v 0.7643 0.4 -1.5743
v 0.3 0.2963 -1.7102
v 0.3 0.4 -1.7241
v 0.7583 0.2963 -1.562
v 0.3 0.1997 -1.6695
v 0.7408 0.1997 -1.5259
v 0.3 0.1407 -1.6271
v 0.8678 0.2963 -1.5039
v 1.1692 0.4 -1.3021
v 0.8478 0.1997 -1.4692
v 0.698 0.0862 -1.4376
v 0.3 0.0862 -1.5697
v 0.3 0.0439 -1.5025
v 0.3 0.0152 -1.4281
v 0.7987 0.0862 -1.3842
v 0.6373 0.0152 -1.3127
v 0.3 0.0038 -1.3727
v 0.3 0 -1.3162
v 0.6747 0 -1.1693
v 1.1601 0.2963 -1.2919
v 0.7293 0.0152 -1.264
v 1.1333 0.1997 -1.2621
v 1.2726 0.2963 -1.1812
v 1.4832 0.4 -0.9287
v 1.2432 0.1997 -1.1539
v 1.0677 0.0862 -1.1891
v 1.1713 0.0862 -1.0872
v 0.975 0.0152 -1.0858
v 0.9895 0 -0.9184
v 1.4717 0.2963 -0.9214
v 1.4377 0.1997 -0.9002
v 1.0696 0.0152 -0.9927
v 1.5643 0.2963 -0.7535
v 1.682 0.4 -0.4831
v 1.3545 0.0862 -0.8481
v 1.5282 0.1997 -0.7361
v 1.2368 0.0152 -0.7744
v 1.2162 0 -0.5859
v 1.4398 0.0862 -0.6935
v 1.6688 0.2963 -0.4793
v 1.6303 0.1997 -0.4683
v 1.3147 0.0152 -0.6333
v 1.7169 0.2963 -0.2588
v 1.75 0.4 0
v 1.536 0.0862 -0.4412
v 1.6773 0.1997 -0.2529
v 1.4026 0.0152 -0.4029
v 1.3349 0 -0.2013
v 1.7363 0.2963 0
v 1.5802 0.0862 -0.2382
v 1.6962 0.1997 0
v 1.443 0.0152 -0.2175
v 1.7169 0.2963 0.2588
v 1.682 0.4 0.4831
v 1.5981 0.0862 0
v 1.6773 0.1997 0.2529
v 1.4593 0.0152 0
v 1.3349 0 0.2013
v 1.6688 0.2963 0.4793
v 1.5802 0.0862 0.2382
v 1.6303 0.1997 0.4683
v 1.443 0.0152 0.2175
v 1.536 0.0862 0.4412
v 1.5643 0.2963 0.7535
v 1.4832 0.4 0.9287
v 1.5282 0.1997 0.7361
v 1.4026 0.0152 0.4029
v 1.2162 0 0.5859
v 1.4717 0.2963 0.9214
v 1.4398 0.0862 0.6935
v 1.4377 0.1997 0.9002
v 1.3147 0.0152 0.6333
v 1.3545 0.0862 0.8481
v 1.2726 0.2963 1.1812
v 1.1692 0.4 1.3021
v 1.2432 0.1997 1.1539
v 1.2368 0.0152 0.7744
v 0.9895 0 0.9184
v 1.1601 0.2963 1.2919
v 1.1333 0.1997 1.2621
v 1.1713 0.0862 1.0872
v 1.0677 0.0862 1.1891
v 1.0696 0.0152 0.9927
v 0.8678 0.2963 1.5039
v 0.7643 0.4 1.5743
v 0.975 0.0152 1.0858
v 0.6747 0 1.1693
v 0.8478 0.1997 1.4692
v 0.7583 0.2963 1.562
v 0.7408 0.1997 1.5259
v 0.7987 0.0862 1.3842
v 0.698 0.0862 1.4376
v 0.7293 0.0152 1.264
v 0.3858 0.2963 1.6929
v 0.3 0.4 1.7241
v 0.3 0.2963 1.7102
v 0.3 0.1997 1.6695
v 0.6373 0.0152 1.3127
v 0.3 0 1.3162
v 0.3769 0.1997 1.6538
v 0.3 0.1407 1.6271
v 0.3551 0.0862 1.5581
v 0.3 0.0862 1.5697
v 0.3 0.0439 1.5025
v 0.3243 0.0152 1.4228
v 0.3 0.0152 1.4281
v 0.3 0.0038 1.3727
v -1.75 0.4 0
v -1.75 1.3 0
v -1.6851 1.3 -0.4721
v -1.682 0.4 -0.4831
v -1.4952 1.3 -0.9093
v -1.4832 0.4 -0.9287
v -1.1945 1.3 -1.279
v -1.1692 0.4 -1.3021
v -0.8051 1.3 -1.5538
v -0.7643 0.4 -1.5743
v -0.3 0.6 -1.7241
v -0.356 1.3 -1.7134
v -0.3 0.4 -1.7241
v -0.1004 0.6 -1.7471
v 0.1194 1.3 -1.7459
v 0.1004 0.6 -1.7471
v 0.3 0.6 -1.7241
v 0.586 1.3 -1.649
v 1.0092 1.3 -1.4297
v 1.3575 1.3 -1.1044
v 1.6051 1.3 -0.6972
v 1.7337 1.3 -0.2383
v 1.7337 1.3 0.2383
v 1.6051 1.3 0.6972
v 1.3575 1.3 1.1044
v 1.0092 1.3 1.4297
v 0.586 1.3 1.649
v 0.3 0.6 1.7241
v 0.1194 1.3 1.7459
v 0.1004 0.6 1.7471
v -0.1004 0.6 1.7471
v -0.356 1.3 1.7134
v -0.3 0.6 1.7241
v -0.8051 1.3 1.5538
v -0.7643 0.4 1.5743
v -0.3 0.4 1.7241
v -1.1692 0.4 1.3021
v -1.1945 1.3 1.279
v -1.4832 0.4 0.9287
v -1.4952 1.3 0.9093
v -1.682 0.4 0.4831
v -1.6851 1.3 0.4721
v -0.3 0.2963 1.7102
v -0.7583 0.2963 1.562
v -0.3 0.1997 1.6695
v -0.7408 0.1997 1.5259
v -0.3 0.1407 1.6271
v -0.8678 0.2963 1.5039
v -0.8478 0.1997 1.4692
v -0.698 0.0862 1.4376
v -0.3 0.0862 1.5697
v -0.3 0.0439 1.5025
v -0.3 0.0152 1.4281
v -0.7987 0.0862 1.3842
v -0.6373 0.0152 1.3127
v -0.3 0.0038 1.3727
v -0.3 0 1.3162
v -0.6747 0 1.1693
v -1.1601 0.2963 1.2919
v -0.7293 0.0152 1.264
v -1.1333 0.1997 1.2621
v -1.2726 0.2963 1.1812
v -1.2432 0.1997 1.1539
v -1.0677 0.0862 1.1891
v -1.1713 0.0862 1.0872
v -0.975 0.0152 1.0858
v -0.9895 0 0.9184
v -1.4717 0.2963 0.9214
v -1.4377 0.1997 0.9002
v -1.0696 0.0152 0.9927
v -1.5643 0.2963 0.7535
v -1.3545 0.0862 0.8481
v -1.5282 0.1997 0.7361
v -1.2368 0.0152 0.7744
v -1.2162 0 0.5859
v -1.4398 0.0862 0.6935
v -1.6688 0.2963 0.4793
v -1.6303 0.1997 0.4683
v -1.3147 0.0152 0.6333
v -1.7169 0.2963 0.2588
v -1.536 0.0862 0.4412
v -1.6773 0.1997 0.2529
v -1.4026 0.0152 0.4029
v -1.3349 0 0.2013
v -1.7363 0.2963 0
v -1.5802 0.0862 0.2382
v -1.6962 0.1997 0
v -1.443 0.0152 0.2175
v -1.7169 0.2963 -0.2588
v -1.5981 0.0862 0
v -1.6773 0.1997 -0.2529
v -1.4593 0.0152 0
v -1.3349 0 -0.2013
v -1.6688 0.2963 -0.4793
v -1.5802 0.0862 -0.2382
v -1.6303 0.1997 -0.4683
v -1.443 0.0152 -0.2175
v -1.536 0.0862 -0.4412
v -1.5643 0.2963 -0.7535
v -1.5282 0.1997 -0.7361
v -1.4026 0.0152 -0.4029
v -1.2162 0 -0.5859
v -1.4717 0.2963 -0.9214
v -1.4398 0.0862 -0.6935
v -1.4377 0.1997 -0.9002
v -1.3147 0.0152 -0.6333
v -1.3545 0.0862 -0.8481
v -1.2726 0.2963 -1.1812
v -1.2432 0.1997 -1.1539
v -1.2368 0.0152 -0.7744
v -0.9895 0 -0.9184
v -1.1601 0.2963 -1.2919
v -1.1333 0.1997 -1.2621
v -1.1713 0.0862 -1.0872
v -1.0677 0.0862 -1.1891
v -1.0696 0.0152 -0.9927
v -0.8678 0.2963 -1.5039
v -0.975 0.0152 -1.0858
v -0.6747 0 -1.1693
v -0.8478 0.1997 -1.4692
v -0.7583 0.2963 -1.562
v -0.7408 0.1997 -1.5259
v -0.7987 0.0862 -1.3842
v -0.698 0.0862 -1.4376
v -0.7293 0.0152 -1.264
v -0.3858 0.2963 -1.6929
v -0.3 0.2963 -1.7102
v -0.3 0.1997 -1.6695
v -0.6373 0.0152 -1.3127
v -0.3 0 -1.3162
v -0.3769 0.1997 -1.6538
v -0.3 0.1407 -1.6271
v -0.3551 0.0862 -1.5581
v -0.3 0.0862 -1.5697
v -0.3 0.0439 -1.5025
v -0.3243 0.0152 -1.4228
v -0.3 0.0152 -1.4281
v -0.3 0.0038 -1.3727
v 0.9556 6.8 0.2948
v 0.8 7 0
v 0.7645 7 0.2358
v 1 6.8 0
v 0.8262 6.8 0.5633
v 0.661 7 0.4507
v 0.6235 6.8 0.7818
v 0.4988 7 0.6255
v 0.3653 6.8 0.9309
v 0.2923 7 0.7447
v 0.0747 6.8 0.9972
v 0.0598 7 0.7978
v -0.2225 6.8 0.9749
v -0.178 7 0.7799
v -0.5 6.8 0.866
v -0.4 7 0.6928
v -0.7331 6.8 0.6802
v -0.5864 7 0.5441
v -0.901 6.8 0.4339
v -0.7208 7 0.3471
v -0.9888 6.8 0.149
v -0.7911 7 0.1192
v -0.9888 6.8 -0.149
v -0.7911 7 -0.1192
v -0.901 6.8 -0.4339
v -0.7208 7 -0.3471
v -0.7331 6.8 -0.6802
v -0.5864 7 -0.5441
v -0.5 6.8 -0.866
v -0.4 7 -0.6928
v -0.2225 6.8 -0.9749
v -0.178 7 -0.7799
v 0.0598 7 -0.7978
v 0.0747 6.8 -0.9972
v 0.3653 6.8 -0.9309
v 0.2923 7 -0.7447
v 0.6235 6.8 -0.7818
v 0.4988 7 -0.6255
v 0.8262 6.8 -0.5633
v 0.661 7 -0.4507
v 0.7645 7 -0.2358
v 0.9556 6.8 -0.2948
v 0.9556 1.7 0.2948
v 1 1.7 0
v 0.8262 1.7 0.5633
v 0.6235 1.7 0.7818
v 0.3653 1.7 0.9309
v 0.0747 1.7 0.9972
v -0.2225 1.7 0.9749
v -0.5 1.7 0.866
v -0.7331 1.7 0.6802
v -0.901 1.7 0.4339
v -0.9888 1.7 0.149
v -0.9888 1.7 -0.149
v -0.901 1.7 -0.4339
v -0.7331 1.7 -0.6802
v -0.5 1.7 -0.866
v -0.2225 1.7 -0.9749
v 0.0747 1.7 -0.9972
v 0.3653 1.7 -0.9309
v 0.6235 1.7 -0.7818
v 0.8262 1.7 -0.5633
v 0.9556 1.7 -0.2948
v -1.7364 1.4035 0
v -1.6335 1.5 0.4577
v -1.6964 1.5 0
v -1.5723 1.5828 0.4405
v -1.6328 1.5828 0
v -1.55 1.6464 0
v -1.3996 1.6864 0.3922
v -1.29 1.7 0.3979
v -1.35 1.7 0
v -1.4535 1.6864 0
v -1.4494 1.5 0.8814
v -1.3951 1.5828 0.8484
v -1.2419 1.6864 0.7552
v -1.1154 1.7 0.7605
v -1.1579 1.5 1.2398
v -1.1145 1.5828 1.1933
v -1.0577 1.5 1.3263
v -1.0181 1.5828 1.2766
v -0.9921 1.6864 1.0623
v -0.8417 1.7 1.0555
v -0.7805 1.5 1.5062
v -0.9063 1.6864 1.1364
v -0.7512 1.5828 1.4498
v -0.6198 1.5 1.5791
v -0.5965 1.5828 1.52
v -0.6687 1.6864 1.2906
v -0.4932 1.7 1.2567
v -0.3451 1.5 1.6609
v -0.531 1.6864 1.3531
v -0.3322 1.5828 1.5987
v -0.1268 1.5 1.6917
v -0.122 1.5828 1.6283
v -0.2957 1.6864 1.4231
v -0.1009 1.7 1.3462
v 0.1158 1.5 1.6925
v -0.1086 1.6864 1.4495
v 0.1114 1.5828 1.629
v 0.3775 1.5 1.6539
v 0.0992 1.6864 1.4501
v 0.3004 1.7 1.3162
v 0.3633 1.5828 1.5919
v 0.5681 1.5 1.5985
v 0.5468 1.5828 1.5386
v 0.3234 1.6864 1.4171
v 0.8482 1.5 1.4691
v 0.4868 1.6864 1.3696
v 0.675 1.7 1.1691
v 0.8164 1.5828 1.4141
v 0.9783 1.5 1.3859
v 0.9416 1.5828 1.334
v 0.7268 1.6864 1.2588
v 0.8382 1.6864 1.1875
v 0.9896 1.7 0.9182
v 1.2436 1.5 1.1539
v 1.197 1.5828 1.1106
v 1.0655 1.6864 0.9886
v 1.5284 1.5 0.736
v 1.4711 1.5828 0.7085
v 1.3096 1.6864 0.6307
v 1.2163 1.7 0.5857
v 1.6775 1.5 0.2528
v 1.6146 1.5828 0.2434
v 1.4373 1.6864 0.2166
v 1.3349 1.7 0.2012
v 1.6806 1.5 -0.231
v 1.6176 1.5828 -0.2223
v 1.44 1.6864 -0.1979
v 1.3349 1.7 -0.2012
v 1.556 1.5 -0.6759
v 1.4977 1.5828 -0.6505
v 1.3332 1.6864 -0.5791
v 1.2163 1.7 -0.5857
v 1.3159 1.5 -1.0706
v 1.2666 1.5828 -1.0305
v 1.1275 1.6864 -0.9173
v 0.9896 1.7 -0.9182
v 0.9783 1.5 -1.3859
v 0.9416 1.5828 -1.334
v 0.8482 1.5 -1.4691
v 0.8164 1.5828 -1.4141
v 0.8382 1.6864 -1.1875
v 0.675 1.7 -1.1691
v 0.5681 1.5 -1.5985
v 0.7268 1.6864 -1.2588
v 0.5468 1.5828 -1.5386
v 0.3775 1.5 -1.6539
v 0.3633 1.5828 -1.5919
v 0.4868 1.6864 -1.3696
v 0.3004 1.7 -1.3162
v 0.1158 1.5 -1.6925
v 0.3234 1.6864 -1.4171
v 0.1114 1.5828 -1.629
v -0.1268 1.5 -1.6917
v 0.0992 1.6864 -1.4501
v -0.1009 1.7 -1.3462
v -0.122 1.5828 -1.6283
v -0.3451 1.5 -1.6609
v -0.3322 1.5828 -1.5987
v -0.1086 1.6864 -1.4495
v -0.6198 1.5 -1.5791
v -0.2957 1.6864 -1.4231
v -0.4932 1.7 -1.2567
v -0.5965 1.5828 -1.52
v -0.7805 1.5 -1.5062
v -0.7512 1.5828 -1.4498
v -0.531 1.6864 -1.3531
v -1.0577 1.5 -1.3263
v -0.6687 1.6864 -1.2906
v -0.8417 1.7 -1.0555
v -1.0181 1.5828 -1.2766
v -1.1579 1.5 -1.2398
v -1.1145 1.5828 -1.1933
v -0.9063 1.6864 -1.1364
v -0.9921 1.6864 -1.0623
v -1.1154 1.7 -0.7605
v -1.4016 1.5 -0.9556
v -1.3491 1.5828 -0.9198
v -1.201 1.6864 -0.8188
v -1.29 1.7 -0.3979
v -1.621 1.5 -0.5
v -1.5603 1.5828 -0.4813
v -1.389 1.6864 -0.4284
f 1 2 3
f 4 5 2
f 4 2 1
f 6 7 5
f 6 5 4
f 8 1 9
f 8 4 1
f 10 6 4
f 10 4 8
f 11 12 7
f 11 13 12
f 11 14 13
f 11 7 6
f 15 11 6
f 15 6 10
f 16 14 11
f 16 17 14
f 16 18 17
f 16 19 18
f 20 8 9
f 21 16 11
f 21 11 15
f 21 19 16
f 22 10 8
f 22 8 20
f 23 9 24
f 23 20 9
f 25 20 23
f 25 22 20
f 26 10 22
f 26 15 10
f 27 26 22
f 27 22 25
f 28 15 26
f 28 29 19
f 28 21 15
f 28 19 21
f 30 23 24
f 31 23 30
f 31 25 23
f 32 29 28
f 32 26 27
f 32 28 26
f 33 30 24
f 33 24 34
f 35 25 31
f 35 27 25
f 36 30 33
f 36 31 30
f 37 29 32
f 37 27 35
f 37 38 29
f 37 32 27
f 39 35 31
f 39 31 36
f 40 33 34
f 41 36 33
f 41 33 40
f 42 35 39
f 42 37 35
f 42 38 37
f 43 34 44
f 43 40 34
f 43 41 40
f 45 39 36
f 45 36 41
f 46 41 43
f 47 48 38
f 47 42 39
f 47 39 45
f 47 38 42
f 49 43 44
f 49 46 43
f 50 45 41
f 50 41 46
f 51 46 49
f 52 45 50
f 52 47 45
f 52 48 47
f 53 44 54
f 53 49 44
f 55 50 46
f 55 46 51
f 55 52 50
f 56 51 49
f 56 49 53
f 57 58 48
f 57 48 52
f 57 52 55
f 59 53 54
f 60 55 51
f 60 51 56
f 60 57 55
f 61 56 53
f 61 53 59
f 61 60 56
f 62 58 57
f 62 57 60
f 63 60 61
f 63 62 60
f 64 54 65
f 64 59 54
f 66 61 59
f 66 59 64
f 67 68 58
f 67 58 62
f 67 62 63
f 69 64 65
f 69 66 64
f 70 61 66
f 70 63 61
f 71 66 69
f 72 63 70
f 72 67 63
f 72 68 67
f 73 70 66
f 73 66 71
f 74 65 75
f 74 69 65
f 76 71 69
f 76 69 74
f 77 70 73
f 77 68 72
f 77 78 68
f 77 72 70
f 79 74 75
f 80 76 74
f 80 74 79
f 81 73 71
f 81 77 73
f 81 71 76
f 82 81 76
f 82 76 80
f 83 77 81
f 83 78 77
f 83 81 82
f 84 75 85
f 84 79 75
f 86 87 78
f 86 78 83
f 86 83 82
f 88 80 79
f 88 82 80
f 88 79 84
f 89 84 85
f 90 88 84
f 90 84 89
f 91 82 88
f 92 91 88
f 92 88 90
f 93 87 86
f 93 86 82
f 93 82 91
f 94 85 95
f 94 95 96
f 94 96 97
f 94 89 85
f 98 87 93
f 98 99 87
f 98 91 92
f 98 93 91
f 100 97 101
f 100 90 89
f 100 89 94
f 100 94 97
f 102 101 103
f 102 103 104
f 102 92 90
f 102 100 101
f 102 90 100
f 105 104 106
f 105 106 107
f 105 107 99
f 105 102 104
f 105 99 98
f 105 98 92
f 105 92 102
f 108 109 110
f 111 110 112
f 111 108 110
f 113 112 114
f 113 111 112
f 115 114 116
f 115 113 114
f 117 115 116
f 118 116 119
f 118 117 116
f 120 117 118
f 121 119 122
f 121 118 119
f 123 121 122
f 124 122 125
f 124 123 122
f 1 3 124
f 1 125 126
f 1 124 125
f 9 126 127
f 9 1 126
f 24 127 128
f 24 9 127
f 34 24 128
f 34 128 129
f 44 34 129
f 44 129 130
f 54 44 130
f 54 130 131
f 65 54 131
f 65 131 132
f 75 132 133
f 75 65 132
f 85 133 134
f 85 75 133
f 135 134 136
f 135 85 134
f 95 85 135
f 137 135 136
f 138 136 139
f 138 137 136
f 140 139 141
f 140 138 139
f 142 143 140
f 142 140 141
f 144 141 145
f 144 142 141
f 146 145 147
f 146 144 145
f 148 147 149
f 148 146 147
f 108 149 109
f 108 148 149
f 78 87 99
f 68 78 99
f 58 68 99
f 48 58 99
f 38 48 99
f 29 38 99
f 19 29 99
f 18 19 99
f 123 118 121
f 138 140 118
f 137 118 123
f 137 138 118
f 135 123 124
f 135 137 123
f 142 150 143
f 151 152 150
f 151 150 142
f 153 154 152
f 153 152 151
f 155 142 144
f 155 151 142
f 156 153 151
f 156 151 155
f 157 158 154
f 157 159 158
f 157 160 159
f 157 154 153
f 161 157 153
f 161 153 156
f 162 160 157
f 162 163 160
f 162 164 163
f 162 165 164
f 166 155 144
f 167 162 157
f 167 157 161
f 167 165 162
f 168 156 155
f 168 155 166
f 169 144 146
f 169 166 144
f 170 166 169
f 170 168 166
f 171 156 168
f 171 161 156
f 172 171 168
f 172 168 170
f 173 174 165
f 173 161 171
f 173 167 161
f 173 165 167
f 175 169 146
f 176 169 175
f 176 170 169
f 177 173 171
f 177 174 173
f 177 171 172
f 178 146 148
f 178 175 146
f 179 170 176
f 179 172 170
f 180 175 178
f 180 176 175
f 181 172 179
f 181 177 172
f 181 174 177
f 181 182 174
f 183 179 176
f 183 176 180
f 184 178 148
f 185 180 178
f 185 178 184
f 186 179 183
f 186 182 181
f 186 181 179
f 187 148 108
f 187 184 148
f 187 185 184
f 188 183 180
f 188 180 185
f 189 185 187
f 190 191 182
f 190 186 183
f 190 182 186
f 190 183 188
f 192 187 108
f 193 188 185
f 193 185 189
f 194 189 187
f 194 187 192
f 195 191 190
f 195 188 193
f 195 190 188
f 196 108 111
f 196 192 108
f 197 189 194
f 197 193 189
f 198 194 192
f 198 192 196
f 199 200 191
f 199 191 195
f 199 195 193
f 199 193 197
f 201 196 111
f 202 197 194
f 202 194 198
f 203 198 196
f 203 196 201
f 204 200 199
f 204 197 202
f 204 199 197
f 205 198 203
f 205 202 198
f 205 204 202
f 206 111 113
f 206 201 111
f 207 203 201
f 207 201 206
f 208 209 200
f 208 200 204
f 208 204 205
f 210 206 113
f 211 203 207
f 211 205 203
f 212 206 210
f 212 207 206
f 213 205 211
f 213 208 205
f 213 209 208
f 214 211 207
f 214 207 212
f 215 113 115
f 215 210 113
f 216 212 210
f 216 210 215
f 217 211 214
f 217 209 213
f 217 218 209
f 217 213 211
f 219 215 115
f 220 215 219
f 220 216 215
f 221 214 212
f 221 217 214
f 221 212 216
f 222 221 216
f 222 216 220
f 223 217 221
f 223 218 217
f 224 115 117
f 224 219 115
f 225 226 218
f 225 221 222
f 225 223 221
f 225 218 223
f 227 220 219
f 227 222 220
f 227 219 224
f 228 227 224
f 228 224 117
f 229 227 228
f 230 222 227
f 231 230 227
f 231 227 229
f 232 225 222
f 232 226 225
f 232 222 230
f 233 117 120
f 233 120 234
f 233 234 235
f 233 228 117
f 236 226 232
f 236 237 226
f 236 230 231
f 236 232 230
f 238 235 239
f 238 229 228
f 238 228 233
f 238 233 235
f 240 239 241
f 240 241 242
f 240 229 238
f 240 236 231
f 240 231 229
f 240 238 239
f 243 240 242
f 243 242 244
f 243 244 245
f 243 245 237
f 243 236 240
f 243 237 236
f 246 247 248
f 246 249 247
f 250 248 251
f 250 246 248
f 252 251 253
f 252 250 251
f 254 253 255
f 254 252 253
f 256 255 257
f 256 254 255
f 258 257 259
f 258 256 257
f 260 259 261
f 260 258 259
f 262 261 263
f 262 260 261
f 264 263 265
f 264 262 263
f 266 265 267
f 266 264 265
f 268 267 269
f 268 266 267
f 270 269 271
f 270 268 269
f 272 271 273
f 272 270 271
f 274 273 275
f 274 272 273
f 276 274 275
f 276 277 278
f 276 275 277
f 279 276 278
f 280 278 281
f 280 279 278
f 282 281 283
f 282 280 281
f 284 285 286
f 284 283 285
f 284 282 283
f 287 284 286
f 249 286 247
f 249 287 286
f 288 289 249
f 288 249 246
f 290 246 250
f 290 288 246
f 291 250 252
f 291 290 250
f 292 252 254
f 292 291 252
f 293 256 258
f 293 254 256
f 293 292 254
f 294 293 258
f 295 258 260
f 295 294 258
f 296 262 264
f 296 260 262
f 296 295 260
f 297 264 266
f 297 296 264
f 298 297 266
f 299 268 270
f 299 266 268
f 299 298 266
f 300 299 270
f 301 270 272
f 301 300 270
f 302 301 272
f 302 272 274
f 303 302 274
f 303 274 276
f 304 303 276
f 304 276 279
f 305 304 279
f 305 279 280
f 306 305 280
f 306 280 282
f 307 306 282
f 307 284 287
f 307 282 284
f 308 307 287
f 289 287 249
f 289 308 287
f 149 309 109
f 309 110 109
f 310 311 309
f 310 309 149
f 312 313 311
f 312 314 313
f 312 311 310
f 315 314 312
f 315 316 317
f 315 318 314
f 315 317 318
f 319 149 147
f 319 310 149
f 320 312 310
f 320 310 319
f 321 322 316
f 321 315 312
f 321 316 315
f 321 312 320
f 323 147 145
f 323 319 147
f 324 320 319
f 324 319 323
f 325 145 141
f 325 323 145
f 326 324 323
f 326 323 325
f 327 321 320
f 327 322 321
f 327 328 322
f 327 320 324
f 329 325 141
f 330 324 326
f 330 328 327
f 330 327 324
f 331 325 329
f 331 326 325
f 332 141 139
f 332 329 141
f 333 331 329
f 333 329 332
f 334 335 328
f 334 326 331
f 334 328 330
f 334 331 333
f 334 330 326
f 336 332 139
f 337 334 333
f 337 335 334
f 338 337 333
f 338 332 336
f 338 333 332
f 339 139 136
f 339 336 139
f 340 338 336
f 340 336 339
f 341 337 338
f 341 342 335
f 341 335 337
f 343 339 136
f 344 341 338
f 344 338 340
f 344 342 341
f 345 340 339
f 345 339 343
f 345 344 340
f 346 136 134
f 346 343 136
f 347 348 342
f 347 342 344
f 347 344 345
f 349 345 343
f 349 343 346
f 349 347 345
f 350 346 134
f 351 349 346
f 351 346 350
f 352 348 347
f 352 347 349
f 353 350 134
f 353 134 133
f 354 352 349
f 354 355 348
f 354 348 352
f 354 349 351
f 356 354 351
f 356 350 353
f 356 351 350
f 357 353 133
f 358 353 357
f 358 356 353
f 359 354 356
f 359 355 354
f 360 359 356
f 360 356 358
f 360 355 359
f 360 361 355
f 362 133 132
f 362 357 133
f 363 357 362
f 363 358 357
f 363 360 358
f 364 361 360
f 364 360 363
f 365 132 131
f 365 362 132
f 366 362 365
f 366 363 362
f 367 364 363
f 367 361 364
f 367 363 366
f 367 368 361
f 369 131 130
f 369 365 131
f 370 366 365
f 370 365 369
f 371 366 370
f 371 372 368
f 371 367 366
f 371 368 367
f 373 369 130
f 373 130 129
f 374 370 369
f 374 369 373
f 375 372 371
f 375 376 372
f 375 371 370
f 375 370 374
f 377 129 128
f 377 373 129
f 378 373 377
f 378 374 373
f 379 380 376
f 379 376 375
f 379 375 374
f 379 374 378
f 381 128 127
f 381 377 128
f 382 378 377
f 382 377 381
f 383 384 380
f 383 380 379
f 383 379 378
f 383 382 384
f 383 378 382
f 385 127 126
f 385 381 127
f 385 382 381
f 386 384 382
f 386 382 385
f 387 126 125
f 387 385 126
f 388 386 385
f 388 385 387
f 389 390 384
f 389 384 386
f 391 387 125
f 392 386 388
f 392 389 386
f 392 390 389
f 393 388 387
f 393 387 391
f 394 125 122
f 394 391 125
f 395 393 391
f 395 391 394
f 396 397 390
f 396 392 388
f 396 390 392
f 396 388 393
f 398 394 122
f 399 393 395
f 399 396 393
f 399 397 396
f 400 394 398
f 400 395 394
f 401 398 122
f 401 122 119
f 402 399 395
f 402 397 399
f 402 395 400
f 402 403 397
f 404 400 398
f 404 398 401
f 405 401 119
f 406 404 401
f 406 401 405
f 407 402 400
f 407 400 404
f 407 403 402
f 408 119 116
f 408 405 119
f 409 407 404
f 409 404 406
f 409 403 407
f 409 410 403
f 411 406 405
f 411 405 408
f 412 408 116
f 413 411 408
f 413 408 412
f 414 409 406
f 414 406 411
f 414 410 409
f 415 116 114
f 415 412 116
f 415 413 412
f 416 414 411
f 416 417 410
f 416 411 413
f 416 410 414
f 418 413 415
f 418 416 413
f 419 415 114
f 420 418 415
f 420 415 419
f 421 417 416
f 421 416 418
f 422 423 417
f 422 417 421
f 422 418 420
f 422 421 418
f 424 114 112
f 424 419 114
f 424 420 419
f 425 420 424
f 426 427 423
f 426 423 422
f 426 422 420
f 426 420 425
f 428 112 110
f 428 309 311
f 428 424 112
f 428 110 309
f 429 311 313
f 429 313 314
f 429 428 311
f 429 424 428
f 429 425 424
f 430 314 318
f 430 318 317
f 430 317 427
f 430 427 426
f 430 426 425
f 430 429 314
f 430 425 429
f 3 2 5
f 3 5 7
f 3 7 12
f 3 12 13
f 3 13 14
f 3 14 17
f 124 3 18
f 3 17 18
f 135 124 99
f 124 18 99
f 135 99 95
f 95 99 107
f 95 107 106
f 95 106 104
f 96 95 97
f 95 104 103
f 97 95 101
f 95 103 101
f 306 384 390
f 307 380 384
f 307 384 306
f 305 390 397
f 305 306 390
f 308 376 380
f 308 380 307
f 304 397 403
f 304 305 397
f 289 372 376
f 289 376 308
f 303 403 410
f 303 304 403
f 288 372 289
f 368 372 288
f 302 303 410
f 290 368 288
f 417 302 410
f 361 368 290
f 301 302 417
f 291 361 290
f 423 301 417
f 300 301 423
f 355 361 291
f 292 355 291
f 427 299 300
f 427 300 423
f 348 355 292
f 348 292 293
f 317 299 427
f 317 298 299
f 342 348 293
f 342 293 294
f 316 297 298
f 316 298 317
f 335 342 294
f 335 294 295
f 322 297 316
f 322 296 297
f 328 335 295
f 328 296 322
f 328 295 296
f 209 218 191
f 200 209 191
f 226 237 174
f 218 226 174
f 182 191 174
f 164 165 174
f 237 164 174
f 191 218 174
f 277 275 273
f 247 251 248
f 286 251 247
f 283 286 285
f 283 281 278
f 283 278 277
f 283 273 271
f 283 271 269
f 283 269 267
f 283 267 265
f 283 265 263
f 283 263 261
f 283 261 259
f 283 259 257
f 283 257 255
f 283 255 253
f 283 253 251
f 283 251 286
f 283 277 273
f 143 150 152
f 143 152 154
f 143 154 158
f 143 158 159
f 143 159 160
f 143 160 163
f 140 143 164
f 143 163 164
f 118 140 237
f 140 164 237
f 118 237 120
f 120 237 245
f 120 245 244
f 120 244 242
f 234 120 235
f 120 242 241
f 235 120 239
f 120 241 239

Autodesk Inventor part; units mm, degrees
ref_plane "YZ Plane" through (0, 0, 0) normal (1, 0, 0) x (0, 1, 0)
ref_plane "XZ Plane" through (0, 0, 0) normal (0, 1, 0) x (-1, 0, 0)
ref_plane "XY Plane" through (0, 0, 0) normal (0, 0, 1) x (1, 0, 0)
sketch "Sketch1" plane through (0, 0, 0) normal (0, 1, 0) x (-1, 0, 0)
  circle A0 centre (0, 0) radius 1.75
  dimension "d0" = 3.5
extrude "Extrusion1" add sketch "Sketch1" along normal blind 1.7
sketch "Sketch2" plane through (0, 1.7, 0) normal (0, 1, 0) x (1, 0, 0)
  circle A0 centre (0, 0) radius 1
  dimension "d3" = 2
extrude "Extrusion2" add sketch "Sketch2" along normal blind 5.3
thread "Thread1" size "M2.5x0.45" class "6g" standard "ANSI Metric M Profile" full length
fillet "Fillet1" radius 0.4 2 edges at (1.75, 1.7, 0) (1.75, 0, 0)
sketch "Sketch3" plane through (0, 0, 0) normal (0, -1, 0) x (1, 0, 0)
  line L0 (-0.3, -1.75) -> (0.3, -1.75)
  line L1 (0.3, -1.75) -> (0.3, 1.75)
  line L2 (0.3, 1.75) -> (-0.3, 1.75)
  line L3 (-0.3, 1.75) -> (-0.3, -1.75)
  line L4 (-0.3, -1.75) -> (0.3, 1.75) construction
  line L5 (0.3, -1.75) -> (-0.3, 1.75) construction
  circle A0 centre (0, 0) radius 1.75 projected
  point P0 (0.3, -1.7241)
  point P1 (0.3, 1.7241)
  point P2 (-0.3, 1.7241)
  point P3 (-0.3, -1.7241)
  dimension "d9" = 0.6
extrude "Extrusion3" cut sketch "Sketch3" against normal blind 0.6 contours A0 L3 L1
chamfer "Chamfer1" distance 0.2 angle 45 1 edges at (-1, 7, 0)
properties part number "connector_screw" material "Aluminum 6061-AHC"
